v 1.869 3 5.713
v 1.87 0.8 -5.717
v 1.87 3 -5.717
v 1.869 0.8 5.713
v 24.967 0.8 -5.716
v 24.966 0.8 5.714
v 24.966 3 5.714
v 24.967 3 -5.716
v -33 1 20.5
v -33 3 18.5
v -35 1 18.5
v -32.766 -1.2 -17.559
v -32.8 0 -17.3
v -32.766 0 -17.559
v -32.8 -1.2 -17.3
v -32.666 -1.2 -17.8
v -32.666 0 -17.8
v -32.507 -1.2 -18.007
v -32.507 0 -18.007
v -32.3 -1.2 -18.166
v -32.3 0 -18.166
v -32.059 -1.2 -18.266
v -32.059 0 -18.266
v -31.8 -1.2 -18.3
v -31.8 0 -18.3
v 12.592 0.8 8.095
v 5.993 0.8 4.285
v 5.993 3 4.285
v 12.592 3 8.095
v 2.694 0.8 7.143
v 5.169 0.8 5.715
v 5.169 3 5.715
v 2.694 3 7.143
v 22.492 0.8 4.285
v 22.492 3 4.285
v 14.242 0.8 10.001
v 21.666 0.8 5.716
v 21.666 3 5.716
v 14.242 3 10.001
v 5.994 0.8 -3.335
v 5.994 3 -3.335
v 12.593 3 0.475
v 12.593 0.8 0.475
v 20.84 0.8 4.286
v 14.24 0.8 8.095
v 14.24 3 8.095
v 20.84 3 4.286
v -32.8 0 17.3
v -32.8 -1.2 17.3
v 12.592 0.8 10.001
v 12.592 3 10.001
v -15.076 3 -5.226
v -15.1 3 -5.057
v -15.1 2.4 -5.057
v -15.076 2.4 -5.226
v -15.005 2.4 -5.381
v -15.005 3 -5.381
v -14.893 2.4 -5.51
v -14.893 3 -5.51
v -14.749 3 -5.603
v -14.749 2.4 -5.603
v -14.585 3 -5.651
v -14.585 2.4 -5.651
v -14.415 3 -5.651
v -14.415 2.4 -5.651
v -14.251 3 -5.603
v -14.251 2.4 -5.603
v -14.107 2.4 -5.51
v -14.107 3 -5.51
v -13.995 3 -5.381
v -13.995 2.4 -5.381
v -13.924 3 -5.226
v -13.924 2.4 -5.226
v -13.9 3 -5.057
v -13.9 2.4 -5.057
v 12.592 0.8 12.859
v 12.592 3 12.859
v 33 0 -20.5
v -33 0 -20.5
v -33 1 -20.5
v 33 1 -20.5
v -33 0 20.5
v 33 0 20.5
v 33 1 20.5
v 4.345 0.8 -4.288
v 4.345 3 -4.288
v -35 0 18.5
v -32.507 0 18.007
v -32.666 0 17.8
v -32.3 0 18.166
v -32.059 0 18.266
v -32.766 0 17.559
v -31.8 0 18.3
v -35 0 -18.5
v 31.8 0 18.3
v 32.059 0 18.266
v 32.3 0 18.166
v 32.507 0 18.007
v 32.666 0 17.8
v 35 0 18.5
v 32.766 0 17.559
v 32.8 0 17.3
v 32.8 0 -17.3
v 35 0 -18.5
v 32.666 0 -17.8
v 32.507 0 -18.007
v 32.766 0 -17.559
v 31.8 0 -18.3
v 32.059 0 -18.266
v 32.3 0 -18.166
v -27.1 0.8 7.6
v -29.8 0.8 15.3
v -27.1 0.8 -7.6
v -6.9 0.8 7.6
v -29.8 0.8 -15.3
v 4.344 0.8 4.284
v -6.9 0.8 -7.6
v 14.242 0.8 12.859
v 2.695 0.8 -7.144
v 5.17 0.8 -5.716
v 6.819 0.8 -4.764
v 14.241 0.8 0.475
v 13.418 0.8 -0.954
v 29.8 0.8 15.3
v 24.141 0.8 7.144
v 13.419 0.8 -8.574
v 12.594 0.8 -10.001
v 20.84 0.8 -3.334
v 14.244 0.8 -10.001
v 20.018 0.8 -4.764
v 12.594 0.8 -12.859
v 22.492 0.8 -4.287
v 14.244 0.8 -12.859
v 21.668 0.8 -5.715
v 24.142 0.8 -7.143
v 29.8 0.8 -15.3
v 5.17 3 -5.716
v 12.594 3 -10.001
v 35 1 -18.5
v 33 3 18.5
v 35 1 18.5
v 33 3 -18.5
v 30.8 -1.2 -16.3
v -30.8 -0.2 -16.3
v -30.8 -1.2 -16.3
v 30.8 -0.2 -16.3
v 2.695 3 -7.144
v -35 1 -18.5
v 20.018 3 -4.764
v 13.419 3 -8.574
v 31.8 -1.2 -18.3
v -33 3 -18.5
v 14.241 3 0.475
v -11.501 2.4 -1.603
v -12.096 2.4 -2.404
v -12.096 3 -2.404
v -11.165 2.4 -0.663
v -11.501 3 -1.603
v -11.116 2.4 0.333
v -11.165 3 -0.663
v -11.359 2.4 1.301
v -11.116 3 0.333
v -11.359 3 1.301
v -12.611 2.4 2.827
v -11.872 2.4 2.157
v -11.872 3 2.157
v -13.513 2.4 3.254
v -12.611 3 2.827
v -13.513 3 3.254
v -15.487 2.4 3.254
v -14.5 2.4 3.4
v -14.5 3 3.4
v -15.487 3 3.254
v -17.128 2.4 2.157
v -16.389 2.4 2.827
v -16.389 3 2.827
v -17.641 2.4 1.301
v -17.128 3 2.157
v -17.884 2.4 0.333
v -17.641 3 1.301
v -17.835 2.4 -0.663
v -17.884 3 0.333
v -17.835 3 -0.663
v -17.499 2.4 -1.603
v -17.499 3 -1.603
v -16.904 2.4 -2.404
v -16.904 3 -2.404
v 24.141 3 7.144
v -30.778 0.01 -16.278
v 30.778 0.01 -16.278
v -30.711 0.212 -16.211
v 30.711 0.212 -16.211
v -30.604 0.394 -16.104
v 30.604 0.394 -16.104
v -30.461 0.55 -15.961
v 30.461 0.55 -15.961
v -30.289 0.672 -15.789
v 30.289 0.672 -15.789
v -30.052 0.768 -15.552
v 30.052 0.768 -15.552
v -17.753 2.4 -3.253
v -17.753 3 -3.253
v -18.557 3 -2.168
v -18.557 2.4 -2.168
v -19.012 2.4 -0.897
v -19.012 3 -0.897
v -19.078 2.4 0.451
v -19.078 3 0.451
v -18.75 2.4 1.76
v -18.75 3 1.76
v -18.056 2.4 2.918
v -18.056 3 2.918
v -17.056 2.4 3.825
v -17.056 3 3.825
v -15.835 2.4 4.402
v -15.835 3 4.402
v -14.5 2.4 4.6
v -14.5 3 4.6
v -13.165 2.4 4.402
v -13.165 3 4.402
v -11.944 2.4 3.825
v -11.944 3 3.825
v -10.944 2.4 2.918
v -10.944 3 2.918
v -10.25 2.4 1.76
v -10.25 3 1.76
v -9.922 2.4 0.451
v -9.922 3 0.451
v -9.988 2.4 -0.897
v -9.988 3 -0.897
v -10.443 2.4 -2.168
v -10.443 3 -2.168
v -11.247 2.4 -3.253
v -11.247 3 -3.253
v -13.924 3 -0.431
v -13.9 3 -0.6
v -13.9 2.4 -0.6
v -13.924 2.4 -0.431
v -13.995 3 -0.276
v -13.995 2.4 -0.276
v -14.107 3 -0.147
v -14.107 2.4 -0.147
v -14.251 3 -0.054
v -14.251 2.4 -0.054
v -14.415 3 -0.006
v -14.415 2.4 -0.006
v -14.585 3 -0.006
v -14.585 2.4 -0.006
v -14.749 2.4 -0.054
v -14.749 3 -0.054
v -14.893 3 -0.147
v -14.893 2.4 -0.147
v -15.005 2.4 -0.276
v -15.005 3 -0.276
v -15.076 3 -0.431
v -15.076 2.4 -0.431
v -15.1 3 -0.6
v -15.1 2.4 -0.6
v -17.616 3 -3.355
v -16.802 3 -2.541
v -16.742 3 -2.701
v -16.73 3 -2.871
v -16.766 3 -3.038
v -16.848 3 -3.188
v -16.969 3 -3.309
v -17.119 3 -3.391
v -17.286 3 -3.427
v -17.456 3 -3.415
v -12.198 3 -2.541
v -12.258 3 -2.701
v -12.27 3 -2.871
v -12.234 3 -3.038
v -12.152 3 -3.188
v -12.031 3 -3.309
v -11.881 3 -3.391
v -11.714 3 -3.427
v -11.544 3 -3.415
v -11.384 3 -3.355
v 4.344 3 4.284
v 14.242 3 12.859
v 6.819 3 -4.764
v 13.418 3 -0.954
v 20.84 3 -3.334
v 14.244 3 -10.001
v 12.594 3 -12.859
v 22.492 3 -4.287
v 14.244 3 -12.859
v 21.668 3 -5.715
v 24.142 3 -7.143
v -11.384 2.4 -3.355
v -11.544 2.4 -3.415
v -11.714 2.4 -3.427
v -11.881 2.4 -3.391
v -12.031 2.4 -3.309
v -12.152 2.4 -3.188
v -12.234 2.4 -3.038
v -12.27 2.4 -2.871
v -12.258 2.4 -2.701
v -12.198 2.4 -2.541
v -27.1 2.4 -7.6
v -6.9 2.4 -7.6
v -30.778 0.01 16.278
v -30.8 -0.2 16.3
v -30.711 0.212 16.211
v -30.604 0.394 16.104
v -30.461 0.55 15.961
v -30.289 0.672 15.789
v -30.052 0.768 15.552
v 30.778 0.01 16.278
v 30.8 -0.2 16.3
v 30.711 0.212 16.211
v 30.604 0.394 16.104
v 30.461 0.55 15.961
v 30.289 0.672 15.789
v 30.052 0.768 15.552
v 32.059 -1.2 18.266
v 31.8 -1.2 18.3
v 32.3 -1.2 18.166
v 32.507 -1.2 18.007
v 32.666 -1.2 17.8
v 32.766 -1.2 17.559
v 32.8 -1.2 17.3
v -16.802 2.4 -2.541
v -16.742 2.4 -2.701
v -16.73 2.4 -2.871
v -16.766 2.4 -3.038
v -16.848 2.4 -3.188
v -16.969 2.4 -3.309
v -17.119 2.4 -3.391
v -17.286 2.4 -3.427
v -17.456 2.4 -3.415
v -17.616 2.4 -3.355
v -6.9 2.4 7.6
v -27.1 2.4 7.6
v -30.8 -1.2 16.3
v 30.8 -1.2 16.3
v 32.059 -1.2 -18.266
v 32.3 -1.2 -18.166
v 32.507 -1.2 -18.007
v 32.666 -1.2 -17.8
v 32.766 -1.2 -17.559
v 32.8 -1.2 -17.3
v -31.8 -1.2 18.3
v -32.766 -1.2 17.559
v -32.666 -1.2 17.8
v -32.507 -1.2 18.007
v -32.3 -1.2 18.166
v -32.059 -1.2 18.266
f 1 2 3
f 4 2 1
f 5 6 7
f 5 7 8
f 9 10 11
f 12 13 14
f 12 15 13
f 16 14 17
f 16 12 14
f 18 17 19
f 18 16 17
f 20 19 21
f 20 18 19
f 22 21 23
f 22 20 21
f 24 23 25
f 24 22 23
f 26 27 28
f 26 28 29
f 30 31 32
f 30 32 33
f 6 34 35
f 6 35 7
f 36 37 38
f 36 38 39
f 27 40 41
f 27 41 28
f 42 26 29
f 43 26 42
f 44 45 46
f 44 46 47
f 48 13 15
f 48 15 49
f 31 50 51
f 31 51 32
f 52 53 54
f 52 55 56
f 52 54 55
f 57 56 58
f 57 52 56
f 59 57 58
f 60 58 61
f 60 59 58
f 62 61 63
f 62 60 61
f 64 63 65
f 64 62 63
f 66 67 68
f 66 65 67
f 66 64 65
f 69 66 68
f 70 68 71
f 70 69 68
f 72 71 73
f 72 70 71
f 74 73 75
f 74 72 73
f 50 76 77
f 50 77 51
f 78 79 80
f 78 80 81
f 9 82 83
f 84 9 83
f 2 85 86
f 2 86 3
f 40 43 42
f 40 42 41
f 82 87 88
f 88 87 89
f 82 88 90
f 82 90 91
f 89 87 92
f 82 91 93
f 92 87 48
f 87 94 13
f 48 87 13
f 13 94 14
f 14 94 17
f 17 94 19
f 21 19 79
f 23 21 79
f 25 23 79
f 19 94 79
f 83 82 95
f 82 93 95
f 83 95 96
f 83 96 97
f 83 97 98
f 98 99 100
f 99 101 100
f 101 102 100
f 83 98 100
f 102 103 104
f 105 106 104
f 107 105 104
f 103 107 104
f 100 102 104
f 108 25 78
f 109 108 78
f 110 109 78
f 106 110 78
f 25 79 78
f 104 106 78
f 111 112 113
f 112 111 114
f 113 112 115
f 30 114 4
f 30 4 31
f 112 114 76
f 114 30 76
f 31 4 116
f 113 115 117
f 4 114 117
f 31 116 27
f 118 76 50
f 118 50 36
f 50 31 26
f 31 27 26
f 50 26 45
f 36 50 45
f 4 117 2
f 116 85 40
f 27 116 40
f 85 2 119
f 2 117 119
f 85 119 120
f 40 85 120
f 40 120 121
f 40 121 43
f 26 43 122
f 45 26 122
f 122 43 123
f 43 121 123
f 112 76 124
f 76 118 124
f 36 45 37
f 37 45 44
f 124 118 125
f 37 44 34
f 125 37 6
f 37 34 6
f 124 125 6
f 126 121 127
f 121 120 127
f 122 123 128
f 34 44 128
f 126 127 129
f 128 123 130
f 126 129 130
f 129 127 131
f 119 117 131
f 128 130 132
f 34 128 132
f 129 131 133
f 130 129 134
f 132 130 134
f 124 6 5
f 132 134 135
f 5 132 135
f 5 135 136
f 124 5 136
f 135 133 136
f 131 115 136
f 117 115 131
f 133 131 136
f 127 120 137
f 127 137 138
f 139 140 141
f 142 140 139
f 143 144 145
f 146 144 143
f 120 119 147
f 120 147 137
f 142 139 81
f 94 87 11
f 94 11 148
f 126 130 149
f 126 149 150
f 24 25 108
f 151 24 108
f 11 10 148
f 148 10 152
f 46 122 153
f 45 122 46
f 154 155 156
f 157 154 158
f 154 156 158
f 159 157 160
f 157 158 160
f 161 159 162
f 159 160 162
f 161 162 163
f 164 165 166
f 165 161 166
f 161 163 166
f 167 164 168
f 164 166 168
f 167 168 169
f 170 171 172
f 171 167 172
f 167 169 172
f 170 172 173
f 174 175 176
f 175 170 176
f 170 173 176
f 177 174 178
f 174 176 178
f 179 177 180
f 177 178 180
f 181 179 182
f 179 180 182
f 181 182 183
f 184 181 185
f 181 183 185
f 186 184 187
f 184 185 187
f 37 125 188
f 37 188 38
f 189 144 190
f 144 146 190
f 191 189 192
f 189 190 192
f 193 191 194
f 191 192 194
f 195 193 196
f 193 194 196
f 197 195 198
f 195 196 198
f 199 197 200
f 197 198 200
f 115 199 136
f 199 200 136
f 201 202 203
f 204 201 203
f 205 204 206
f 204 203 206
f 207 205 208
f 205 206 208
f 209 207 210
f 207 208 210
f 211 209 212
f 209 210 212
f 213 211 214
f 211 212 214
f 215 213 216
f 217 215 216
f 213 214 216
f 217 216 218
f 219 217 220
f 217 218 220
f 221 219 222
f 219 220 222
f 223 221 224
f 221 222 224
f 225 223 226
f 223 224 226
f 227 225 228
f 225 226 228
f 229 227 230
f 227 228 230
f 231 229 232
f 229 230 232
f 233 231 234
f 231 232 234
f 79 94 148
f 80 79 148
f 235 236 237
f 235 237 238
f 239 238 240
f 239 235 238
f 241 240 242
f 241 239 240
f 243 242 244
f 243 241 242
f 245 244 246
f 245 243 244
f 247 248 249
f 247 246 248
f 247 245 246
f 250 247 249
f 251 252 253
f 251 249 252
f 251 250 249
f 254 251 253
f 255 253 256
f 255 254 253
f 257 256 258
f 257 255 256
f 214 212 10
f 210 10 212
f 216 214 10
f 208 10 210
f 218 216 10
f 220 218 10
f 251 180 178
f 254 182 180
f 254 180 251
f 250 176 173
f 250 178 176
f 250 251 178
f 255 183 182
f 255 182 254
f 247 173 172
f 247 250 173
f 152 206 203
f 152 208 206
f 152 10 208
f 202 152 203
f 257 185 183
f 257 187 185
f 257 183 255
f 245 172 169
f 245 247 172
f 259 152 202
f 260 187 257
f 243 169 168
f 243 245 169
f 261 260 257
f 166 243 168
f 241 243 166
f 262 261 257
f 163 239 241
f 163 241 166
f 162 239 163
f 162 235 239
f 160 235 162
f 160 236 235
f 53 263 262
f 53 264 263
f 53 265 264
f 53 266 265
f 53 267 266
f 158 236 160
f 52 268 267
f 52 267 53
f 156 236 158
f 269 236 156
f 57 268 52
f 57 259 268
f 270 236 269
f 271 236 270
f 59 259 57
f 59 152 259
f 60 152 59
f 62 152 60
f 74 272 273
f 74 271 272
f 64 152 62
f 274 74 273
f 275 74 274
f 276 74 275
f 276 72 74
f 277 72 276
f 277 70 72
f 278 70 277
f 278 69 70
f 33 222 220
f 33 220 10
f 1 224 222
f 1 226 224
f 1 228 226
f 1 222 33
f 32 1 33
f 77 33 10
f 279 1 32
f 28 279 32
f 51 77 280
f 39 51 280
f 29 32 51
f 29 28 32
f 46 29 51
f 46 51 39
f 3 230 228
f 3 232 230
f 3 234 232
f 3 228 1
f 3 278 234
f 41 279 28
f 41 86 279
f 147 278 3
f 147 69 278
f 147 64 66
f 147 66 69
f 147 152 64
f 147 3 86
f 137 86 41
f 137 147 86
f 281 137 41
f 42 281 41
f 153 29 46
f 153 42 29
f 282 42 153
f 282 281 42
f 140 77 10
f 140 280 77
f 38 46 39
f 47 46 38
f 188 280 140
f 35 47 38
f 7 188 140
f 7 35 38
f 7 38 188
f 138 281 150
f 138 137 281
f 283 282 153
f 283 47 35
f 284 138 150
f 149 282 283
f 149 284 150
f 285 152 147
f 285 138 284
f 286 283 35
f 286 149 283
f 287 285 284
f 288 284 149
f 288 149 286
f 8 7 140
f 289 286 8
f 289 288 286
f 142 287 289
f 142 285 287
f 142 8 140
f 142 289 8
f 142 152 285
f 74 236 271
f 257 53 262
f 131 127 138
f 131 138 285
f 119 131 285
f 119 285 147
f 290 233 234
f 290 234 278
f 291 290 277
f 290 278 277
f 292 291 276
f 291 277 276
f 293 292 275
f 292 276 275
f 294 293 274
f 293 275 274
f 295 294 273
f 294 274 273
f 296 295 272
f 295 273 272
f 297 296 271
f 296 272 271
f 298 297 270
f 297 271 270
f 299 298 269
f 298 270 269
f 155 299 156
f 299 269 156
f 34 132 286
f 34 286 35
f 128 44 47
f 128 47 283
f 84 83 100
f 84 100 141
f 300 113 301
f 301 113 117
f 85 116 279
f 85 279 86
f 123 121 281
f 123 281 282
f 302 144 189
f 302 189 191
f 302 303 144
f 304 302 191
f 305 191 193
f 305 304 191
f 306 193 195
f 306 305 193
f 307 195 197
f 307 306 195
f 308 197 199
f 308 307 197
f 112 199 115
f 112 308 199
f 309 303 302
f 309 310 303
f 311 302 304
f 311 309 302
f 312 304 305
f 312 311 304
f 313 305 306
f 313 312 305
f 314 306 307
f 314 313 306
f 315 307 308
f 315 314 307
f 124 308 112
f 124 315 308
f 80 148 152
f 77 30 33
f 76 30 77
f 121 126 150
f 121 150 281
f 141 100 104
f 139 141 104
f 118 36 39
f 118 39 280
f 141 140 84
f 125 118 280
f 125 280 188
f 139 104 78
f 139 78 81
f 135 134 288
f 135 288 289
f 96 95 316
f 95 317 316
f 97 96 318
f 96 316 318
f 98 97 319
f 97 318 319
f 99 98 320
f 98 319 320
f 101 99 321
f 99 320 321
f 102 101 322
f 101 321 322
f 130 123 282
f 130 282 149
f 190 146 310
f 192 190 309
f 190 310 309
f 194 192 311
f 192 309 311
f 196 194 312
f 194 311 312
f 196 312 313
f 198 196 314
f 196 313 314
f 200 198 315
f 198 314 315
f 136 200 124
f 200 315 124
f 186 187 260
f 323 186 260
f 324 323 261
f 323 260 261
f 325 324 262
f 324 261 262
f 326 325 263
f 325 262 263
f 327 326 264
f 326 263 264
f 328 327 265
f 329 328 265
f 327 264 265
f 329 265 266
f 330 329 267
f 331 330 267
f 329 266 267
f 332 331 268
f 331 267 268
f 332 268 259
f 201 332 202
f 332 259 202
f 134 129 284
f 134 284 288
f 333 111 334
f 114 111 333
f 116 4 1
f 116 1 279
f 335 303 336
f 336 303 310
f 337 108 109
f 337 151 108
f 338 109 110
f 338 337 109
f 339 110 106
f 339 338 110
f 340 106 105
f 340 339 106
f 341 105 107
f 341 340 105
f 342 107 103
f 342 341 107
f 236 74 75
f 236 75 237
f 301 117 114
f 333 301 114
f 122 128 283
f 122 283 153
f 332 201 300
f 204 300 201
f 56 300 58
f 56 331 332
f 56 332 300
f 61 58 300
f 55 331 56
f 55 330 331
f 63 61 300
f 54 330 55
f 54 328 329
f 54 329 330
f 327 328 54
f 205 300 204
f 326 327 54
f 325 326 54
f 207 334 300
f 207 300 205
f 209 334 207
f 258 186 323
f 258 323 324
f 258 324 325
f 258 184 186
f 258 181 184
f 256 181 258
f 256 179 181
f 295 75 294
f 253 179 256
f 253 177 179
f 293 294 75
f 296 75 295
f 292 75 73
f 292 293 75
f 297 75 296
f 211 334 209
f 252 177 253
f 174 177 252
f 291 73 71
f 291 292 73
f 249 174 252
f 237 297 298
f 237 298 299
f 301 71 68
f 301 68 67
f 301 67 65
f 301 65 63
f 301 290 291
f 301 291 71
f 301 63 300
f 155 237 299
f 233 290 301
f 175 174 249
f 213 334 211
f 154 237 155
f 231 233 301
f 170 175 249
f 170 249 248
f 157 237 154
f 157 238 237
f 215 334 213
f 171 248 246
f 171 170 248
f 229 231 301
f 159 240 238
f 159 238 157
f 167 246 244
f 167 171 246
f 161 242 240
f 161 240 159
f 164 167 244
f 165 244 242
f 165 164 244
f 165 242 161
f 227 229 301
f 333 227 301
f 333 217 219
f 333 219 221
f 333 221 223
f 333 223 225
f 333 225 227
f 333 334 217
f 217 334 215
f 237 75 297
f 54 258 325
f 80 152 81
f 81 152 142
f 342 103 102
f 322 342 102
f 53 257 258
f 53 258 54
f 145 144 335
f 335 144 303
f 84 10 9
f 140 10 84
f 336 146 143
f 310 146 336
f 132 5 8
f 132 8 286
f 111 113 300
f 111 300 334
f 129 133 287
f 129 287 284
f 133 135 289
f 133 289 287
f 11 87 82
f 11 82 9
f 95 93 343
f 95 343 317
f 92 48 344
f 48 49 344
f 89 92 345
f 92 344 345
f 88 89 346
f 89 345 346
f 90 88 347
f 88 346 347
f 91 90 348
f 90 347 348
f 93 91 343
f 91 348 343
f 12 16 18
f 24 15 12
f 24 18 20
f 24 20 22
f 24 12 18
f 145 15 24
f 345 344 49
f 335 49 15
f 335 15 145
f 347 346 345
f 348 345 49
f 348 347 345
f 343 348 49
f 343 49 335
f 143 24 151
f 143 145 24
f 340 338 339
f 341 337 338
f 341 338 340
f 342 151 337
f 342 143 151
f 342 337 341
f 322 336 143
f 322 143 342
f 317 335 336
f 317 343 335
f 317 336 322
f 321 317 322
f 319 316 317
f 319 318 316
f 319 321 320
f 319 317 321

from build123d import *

# Parameters (mm, degrees)
ESQUISSE1_W             = 70
ESQUISSE1_H             = 41
BOSS_EXTRU_1_DEPTH      = 3
COQUE1_T                = -2.2
CHANFREIN1_SIZE         = 2
ESQUISSE3_W             = 20.2
ESQUISSE3_H             = 15.2
ENL_V_MAT_EXTRU_2_DEPTH = 1.6
ENL_V_MAT_EXTRU_5_DEPTH = 41.672472263
ENL_V_START             = -2.2
ENL_V_MAT_EXTRU_4_DEPTH = 2.2
ESQUISSE7_W             = 65.6
ESQUISSE7_H             = 36.6
ESQUISSE7_W_2           = 61.6
ESQUISSE7_H_2           = 32.6
EXTRU_MINCE1_DEPTH      = 2
CONG_1_R                = 1


# Read off the part's stored shape, not the designer's step: Enlèv. mat.-Extru.4
with BuildPart() as part:
    # Esquisse1 → Boss.-Extru.1 (new body)
    with BuildSketch(Plane(origin=(0, 0, 0), x_dir=(1, 0, 0), z_dir=(0, 1, 0))):
        Rectangle(ESQUISSE1_W, ESQUISSE1_H)
    extrude(amount=BOSS_EXTRU_1_DEPTH)

    # Coque1
    coque1_openings = [part.faces().sort_by_distance(p)[0] for p in [
        (0, 0, 0),
    ]]
    offset(amount=COQUE1_T, openings=coque1_openings, kind=Kind.INTERSECTION)

    # Chanfrein1
    chanfrein1_edges = [part.edges().sort_by_distance(p)[0] for p in [
        (-35, 3, 0),
        (0, 3, 20.5),
        (35, 3, 0),
        (35, 1.5, 20.5),
        (-35, 1.5, 20.5),
        (-35, 1.5, -20.5),
        (35, 1.5, -20.5),
        (0, 3, -20.5),
    ]]
    chamfer(chanfrein1_edges, length=CHANFREIN1_SIZE)

    # Esquisse3 → Enlèv. mat.-Extru.2 (cut)
    with BuildSketch(Plane.XZ.offset(-0.8)):
        with Locations((-17, 0)):
            Rectangle(ESQUISSE3_W, ESQUISSE3_H)
    extrude(amount=-ENL_V_MAT_EXTRU_2_DEPTH, mode=Mode.SUBTRACT)

    # Esquisse8 → Enlèv. mat.-Extru.5 (cut, through all)
    with BuildSketch(Plane(origin=(0, 3, 0), x_dir=(1, 0, 0), z_dir=(0, 1, 0))):
        with BuildLine():
            Line((-13.9, 5.056854249), (-13.9, 0.6))
            ThreePointArc((-13.9, 0.6), (-14.5, 0), (-15.1, 0.6))
            Line((-15.1, 0.6), (-15.1, 5.056854249))
            ThreePointArc((-15.1, 5.056854249), (-14.5, 5.656854249), (-13.9, 5.056854249))
        make_face()
        with BuildLine():
            ThreePointArc((-17.752691193, 3.252691193), (-14.5, -4.6), (-11.247308807, 3.252691193))
            ThreePointArc((-11.247308807, 3.252691193), (-12.095836944, 3.252691193), (-12.095836944, 2.404163056))
            ThreePointArc((-12.095836944, 2.404163056), (-14.5, -3.4), (-16.904163056, 2.404163056))
            ThreePointArc((-16.904163056, 2.404163056), (-16.904163056, 3.252691193), (-17.752691193, 3.252691193))
        make_face()
    extrude(amount=-ENL_V_MAT_EXTRU_5_DEPTH, mode=Mode.SUBTRACT)

    # Enlèv. mat.-Extru.4 outline → Enlèv. mat.-Extru.4 (cut)
    with BuildSketch(Plane(origin=(0, 3, 0), x_dir=(1, 0, 0), z_dir=(0, 1, 0)).offset(ENL_V_START)):
        Polygon((21.667594623, 5.714552033), (24.142355296, 7.1431654), (14.244110438, 12.858801818), (14.243939692, 10.001279345), align=None)
        Polygon((12.5925129, -0.475203574), (5.9935572, 3.335122269), (5.993101889, -4.284757181), (12.592057589, -8.095083023), align=None)
        Polygon((4.344642768, 4.288171287), (1.870052841, 5.717080393), (1.869369857, -5.7130095), (4.34413053, -4.284396133), align=None)
        Polygon((12.594164363, 10.001377924), (12.594335108, 12.858900397), (2.695407267, 7.144446922), (5.169997194, 5.715537816), align=None)
        Polygon((5.168559477, -5.714552033), (2.693798804, -7.1431654), (12.592043662, -12.858801818), (12.592214408, -10.001279345), align=None)
        Polygon((14.240438301, -8.095181519), (20.839849312, -4.28564432), (20.840304623, 3.33423513), (14.240893612, -0.47530207), align=None)
        Polygon((13.418138159, 0.954049774), (20.01754917, 4.763586973), (13.41859347, 8.573912816), (6.819182459, 4.764375617), align=None)
        Polygon((22.491511493, -4.285480495), (24.96610142, -5.714389602), (24.966784403, 5.715700292), (22.49202373, 4.287086925), align=None)
        Polygon((14.241989737, -10.001377924), (14.241818992, -12.858900397), (24.140746833, -7.144446922), (21.666156906, -5.715537816), align=None)
    extrude(amount=ENL_V_MAT_EXTRU_4_DEPTH, mode=Mode.SUBTRACT)

    # Esquisse7 → Extru.-Mince1 (add)
    with BuildSketch(Plane.XZ.offset(-0.8)):
        Rectangle(ESQUISSE7_W, ESQUISSE7_H)
        Rectangle(ESQUISSE7_W_2, ESQUISSE7_H_2, mode=Mode.SUBTRACT)
    extrude(amount=EXTRU_MINCE1_DEPTH)

    # Congé1
    cong_1_edges = [part.edges().sort_by_distance(p)[0] for p in [
        (-32.8, -0.6, -18.3),
        (32.8, -0.6, -18.3),
        (32.8, -0.6, 18.3),
        (-32.8, -0.6, 18.3),
        (0, 0.8, -16.3),
        (30.8, 0.8, 0),
        (0, 0.8, 16.3),
        (-30.8, 0.8, 0),
    ]]
    fillet(cong_1_edges, radius=CONG_1_R)


solid = part.part
